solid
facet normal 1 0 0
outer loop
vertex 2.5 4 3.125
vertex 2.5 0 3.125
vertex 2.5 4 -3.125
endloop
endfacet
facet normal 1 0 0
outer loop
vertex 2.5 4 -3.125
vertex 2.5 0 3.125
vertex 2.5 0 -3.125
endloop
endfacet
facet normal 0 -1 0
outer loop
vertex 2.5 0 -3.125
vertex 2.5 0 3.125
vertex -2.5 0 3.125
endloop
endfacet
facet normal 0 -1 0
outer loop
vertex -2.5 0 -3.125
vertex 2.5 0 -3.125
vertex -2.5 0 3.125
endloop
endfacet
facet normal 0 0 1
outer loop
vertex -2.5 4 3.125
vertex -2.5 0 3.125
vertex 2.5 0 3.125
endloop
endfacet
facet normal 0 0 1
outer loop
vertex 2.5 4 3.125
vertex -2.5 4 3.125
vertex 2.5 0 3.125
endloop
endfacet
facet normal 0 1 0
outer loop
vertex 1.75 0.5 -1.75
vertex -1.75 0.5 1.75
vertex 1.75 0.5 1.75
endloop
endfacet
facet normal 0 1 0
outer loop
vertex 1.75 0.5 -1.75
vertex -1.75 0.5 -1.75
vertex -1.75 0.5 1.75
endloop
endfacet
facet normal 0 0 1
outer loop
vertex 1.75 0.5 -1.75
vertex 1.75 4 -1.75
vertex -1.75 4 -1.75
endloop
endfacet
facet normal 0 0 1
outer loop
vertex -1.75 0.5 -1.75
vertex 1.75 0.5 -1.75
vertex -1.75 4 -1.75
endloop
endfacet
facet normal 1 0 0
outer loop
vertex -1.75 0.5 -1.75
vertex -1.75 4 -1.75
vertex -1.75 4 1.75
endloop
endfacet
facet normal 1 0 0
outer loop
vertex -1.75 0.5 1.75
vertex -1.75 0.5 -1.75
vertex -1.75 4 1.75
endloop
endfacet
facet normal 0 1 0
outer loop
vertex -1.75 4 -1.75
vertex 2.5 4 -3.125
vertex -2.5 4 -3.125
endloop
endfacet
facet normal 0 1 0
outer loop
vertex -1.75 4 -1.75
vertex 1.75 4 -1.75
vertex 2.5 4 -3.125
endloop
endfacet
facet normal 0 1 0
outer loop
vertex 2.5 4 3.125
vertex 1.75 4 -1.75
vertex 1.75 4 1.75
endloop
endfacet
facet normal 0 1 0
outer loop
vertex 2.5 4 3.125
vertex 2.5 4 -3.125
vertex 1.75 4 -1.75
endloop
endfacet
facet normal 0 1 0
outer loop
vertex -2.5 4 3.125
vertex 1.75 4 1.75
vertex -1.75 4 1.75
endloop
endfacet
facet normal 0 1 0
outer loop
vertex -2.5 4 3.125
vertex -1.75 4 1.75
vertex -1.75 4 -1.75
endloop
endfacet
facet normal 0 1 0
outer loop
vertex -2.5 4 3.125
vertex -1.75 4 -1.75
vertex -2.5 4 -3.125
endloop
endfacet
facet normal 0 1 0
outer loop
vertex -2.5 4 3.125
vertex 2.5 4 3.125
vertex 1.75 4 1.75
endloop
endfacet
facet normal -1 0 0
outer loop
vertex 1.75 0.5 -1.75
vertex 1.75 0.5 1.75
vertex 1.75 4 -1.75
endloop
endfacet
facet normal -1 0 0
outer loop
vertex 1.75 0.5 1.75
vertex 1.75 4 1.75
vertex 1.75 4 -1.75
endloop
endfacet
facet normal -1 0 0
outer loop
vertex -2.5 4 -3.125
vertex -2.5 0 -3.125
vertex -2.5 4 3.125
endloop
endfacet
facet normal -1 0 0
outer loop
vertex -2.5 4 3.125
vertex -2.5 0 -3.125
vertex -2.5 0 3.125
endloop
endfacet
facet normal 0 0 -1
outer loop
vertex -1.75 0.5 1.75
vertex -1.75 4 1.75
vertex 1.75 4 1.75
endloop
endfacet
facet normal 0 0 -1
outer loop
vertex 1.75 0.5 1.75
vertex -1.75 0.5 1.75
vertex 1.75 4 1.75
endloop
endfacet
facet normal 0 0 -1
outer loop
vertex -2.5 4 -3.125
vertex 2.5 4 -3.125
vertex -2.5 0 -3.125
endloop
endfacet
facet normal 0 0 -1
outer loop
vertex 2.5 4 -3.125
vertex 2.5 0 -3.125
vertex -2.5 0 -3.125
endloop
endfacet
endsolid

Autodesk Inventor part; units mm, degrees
ref_plane "YZ Plane" through (0, 0, 0) normal (1, 0, 0) x (0, 1, 0)
ref_plane "XZ Plane" through (0, 0, 0) normal (0, 1, 0) x (-1, 0, 0)
ref_plane "XY Plane" through (0, 0, 0) normal (0, 0, 1) x (1, 0, 0)
sketch "Sketch1" plane through (0, 0, 0) normal (0, 1, 0) x (-1, 0, 0)
  line L0 (2.5, 3.125) -> (-2.5, 3.125)
  line L1 (-2.5, 3.125) -> (-2.5, -3.125)
  line L2 (-2.5, -3.125) -> (2.5, -3.125)
  line L3 (2.5, -3.125) -> (2.5, 3.125)
  dimension "d3" = 5
extrude "Extrusion1" add sketch "Sketch1" along normal blind 4
sketch "Sketch2" plane through (0, 4, 0) normal (0, 1, 0) x (1, 0, 0)
  line L0 (-1.75, -1.75) -> (1.75, -1.75)
  line L1 (1.75, -1.75) -> (1.75, 1.75)
  line L2 (1.75, 1.75) -> (-1.75, 1.75)
  line L3 (-1.75, 1.75) -> (-1.75, -1.75)
  dimension "d9" = 3.5
extrude "Extrusion2" cut sketch "Sketch2" against normal blind 3.5
properties part number "Double Slit Centre Piece"
